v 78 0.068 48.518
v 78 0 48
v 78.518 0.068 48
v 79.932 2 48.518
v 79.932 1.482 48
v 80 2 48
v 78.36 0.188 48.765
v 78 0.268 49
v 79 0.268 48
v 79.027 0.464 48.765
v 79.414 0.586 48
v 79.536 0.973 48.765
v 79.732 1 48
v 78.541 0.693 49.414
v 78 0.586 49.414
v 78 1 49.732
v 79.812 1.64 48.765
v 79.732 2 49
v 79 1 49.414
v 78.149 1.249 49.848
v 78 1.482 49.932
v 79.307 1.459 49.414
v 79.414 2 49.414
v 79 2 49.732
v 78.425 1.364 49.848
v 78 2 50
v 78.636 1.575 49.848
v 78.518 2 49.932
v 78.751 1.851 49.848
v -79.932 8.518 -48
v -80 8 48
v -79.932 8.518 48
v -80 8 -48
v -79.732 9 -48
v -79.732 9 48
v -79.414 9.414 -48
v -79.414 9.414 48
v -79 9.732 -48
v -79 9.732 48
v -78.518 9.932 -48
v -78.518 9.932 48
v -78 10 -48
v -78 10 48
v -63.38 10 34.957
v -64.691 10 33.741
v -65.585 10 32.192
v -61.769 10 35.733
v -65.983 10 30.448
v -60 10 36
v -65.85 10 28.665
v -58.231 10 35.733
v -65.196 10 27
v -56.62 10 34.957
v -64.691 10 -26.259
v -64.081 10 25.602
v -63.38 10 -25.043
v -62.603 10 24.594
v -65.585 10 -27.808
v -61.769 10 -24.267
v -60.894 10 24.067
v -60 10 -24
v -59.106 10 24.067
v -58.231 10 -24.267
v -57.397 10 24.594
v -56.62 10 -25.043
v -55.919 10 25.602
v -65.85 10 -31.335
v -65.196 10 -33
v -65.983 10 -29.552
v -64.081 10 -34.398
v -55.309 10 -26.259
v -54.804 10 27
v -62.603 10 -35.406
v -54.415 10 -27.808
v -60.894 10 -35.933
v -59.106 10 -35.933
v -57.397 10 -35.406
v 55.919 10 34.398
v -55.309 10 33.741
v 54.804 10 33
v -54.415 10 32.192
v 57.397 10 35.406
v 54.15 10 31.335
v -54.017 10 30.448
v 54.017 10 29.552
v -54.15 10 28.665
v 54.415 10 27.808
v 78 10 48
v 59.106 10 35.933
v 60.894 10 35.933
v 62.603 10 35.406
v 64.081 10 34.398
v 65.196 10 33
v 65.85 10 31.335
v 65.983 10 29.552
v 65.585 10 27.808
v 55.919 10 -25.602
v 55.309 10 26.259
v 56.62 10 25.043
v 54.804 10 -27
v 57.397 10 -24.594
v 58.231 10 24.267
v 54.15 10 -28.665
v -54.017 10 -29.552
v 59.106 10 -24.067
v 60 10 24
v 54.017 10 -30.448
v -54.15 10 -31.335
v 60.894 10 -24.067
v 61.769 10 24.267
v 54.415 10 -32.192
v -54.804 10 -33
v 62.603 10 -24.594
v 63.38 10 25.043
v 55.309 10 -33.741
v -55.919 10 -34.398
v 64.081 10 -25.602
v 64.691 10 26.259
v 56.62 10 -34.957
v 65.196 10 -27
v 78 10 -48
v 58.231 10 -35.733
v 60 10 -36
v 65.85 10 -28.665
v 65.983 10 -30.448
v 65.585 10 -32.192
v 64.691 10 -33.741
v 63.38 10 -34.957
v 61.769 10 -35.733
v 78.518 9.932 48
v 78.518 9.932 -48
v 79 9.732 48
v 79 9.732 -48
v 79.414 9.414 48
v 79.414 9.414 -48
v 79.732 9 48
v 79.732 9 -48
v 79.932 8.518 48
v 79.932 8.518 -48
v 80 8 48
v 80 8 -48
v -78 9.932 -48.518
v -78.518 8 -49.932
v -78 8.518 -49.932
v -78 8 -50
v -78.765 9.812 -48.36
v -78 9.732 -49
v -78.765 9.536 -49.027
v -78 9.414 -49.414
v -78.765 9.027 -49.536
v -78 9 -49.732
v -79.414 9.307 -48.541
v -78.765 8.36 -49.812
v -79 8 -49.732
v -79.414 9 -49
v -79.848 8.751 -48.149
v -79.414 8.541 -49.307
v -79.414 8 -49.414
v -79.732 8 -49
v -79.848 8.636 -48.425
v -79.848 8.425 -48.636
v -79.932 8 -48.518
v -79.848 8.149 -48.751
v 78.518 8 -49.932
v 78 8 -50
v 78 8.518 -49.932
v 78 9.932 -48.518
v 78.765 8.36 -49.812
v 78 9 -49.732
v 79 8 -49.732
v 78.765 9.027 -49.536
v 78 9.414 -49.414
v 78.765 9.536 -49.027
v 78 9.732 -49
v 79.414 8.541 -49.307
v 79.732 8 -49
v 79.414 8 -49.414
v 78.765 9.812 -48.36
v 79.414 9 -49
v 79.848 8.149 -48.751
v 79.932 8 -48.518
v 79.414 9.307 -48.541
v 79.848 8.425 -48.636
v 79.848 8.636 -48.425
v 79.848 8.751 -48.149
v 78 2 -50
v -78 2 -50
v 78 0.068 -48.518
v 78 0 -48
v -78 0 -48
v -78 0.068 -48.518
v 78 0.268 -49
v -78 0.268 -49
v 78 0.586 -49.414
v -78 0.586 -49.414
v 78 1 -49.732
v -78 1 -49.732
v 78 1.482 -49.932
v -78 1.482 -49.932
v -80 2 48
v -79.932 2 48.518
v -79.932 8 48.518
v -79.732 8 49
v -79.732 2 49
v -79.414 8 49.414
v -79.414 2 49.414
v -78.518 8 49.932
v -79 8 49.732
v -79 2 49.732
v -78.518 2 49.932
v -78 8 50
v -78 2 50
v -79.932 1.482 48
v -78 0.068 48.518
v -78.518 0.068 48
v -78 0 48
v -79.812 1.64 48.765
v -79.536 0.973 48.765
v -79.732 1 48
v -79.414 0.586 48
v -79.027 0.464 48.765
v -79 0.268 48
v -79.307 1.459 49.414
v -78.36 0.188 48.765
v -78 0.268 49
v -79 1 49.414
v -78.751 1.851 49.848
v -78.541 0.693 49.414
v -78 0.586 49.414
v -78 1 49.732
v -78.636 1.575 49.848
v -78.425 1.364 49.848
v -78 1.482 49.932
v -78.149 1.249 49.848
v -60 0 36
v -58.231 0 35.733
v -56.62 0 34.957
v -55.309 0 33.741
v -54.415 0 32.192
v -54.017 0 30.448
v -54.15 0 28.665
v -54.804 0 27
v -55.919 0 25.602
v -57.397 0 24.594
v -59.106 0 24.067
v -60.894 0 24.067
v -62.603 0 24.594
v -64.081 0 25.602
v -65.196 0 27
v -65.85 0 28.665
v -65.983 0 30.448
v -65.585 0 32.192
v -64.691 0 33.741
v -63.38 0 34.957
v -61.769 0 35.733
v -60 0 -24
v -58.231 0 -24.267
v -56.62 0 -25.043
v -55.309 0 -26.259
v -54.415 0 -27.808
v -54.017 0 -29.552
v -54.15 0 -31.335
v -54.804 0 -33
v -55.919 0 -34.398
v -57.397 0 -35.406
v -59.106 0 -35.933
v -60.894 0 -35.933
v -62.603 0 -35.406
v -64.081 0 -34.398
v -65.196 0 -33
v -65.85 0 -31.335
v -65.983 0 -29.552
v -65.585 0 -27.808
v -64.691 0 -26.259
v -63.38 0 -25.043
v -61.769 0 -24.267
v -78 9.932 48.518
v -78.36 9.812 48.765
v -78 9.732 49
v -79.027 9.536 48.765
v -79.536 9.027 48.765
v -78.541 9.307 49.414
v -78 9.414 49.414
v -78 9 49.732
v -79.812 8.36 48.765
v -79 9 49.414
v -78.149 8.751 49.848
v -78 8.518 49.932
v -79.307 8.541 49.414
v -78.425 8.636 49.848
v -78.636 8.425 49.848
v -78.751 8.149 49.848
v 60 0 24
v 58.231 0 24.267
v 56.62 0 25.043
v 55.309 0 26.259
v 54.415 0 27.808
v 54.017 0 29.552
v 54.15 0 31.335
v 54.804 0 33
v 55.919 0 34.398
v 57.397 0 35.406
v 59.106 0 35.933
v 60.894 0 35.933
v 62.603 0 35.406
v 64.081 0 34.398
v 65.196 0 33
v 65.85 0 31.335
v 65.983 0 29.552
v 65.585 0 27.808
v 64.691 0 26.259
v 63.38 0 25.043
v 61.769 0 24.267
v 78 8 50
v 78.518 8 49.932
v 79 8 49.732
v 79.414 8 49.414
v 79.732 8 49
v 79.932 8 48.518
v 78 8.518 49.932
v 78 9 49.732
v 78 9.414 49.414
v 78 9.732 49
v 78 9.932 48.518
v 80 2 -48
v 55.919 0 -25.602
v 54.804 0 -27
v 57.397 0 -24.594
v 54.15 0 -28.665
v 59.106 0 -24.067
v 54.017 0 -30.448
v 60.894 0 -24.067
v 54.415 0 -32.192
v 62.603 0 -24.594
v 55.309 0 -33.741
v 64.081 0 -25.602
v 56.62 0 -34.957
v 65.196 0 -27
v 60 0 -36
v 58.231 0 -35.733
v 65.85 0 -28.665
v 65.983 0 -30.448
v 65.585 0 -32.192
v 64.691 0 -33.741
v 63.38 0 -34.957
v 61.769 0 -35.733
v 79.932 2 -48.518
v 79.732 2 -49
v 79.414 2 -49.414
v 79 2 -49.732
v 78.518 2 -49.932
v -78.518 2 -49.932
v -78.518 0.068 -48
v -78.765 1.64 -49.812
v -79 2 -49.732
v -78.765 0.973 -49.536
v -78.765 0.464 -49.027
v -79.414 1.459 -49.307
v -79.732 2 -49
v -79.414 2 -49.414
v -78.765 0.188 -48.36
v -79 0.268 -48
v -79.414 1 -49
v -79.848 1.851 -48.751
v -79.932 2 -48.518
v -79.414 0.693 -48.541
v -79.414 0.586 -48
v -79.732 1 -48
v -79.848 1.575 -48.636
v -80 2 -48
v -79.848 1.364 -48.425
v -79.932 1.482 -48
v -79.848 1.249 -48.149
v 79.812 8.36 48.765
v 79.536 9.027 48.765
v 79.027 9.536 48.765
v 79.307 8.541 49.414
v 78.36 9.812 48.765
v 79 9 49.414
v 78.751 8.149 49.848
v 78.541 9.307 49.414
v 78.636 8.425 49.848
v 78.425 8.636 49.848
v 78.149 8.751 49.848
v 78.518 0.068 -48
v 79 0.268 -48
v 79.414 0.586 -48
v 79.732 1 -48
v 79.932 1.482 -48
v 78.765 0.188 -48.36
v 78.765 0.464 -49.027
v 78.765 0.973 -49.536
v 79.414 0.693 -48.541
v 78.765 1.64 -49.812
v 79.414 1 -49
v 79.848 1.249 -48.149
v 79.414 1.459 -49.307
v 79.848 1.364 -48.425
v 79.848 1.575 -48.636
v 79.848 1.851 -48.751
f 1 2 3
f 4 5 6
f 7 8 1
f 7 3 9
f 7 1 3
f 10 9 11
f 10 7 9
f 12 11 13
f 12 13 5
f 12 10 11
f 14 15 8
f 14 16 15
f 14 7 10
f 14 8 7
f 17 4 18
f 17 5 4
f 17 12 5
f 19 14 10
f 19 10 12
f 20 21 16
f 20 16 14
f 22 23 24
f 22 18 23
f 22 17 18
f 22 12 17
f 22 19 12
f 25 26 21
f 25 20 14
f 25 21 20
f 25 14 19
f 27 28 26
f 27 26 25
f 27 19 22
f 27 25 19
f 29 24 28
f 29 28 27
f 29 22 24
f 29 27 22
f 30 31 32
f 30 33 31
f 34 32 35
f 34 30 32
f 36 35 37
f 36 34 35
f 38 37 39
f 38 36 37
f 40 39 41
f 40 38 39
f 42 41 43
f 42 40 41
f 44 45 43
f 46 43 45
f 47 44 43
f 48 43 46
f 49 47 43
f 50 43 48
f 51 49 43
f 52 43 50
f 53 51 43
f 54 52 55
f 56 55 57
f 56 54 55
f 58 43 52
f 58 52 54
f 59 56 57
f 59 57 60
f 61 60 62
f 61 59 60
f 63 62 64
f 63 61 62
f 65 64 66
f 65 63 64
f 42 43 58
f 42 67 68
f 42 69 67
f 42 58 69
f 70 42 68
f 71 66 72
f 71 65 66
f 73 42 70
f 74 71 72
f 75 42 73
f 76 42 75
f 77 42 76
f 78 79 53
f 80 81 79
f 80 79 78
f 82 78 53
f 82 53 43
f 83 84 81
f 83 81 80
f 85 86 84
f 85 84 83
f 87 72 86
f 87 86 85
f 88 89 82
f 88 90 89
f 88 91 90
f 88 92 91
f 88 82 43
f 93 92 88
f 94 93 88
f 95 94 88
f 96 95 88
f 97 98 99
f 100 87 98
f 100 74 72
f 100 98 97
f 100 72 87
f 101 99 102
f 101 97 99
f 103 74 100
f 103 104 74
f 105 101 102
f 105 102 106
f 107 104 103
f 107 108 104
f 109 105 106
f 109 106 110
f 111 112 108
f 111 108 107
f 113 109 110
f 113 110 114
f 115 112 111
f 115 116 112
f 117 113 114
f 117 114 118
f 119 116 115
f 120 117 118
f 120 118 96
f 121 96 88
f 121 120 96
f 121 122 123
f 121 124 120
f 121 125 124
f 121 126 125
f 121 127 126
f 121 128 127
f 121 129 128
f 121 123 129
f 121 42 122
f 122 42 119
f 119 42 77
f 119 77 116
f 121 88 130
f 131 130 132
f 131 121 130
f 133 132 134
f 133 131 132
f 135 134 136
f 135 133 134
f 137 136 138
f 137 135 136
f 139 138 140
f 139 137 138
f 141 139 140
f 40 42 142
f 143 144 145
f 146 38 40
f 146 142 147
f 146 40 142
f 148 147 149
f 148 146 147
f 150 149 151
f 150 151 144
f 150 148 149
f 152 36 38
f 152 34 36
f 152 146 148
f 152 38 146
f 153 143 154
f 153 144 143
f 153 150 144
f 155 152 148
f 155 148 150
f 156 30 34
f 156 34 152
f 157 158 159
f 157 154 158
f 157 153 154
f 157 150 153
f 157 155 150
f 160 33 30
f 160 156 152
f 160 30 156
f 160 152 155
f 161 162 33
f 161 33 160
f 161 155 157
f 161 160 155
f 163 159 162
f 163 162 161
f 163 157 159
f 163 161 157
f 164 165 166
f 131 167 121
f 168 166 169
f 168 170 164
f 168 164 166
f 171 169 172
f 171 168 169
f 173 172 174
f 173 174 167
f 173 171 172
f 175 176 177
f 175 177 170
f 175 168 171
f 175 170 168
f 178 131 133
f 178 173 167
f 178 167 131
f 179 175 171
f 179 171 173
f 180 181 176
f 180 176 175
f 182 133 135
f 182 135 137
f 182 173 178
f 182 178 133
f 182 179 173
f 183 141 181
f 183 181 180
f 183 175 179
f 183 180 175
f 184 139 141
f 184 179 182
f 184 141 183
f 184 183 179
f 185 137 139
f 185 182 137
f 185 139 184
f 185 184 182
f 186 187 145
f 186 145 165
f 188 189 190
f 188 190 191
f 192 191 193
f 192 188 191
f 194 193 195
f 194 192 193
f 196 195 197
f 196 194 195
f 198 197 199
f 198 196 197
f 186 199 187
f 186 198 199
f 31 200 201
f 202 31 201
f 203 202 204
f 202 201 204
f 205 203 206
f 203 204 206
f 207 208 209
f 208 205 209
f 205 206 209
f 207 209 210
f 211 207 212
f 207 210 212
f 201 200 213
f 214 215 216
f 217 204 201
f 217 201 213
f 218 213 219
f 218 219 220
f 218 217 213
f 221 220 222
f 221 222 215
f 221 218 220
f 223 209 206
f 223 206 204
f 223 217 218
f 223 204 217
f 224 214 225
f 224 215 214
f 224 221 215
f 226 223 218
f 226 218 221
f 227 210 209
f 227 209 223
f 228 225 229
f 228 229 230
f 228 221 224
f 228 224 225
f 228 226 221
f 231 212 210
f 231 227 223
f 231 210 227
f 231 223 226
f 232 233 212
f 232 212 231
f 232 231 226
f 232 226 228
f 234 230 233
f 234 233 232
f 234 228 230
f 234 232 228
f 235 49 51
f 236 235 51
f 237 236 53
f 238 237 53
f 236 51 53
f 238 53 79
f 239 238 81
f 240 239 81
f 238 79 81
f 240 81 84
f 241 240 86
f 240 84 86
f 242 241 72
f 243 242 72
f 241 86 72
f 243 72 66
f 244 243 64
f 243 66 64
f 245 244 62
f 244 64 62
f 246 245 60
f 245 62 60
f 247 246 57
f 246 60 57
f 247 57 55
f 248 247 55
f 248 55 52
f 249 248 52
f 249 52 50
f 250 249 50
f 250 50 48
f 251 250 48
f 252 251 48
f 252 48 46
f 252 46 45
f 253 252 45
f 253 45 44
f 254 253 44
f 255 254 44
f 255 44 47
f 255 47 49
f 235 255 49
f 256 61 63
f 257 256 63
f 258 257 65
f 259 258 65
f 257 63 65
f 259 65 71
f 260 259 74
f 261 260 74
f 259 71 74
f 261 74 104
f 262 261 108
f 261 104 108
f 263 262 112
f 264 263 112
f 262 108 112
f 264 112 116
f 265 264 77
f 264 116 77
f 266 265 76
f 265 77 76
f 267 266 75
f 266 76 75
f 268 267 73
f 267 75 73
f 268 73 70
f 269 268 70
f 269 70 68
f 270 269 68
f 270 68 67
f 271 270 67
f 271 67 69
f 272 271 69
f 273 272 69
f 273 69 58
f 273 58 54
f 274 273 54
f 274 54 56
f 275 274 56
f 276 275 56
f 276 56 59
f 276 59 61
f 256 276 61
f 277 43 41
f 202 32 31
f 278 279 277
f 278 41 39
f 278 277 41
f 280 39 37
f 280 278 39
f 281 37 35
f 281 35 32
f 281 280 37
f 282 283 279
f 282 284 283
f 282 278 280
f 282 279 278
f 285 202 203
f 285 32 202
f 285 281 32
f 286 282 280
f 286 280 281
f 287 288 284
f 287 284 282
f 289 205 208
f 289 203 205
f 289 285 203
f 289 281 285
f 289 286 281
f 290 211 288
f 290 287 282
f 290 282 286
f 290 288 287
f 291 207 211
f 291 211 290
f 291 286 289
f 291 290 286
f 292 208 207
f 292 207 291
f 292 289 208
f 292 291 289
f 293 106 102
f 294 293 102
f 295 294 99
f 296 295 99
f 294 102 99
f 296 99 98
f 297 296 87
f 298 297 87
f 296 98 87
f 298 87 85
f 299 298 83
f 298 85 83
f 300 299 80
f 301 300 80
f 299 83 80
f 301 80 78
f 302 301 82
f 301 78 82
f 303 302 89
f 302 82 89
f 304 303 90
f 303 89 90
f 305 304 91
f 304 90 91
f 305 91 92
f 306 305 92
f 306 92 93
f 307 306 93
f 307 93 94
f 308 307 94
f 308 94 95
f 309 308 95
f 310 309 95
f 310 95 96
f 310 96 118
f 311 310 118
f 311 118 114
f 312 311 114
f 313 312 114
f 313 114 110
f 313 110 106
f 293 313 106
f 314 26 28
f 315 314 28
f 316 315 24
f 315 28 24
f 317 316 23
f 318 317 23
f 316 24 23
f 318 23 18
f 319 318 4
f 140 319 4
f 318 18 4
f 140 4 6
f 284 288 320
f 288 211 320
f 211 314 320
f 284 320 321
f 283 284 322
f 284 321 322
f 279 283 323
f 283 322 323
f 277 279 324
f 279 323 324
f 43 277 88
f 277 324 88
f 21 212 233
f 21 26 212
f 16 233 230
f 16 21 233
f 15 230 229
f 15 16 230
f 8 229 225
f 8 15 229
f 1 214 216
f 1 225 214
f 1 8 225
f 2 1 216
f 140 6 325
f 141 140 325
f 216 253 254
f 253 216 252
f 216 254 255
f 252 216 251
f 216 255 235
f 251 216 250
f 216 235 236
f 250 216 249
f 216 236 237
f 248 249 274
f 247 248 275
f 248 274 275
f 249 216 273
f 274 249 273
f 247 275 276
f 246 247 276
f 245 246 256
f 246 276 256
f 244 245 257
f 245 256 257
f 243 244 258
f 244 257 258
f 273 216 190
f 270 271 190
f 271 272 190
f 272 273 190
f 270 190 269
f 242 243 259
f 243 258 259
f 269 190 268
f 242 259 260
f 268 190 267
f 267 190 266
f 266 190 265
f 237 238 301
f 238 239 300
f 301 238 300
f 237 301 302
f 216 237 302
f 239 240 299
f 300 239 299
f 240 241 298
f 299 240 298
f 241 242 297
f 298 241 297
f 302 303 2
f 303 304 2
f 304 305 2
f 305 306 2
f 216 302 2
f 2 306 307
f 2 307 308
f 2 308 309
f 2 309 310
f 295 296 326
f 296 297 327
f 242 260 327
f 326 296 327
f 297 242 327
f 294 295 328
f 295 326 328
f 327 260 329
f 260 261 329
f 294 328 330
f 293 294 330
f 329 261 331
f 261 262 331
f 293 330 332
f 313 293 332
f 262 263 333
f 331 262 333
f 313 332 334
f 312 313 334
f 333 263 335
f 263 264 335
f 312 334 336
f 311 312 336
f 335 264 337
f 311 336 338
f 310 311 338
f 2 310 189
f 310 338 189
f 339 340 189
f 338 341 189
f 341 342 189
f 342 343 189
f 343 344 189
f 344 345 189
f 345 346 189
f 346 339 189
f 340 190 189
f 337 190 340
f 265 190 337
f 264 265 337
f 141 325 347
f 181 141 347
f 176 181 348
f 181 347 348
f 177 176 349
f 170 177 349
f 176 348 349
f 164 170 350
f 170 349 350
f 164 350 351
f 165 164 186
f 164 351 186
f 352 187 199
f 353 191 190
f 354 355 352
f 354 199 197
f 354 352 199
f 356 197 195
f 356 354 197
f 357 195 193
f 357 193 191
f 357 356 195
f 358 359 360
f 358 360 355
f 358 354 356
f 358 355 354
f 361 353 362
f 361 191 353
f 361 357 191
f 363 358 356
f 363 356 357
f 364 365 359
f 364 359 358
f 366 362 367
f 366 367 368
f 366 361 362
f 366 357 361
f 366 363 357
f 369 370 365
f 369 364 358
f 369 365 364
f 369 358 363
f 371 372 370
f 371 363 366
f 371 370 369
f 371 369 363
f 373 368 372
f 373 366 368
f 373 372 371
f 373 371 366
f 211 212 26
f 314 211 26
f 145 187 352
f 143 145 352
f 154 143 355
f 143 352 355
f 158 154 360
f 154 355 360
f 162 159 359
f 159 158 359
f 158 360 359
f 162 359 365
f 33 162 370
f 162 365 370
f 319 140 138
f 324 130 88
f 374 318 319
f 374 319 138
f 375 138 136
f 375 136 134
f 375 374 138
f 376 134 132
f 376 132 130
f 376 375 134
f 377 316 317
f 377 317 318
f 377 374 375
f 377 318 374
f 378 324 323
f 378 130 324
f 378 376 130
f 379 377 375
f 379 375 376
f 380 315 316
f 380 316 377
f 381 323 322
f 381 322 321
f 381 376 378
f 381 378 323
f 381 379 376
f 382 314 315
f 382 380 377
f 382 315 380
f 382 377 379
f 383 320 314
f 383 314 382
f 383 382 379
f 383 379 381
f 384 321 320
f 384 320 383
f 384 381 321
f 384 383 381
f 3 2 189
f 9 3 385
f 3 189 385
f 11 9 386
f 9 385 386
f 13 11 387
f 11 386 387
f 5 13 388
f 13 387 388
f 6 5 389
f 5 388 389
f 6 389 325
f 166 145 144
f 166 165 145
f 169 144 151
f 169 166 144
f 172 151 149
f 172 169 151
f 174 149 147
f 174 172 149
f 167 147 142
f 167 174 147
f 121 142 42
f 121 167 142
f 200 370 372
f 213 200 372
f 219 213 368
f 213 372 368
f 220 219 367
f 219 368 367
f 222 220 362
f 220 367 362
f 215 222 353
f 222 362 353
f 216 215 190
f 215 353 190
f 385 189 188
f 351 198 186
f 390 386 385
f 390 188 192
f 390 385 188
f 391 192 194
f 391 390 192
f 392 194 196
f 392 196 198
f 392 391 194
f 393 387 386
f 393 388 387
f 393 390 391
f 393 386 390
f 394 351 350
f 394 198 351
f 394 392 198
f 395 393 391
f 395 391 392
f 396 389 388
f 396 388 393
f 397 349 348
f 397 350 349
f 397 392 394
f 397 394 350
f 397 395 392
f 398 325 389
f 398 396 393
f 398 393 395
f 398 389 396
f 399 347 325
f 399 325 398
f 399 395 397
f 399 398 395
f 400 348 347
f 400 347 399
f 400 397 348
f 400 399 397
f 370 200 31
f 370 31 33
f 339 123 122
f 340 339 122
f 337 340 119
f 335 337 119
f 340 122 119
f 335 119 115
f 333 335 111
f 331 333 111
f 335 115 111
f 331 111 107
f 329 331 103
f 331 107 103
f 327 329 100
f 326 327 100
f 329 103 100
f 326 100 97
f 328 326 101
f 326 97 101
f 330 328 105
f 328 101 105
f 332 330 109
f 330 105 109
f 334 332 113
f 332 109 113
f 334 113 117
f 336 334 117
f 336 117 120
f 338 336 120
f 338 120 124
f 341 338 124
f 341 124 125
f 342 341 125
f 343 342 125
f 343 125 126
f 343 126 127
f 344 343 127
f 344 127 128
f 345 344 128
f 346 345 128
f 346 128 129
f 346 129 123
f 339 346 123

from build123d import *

# Parameters (mm, degrees)
SKETCH1_W           = 160
SKETCH1_H           = 100
BOSS_EXTRUDE1_DEPTH = 10
SKETCH2_R           = 6
CUT_EXTRUDE1_DEPTH  = 95.868329805
FILLET1_R           = 2
FILLET2_R           = 2
FILLET3_R           = 2


with BuildPart() as part:
    # Sketch1 → Boss-Extrude1 (new body)
    with BuildSketch(Plane(origin=(0, 0, 0), x_dir=(1, 0, 0), z_dir=(0, 1, 0))):
        Rectangle(SKETCH1_W, SKETCH1_H)
    extrude(amount=BOSS_EXTRUDE1_DEPTH)

    # Sketch2 → Cut-Extrude1 (cut, through all)
    with BuildSketch(Plane(origin=(0, 10, 0), x_dir=(1, 0, 0), z_dir=(0, 1, 0))):
        with Locations(Location((-60, 30, 0), (0, 0, 270))):
            Circle(SKETCH2_R)
        with Locations(Location((-60, -30, 0), (0, 0, 270))):
            Circle(SKETCH2_R)
        with Locations(Location((60, -30, 0), (0, 0, 90))):
            Circle(SKETCH2_R)
        with Locations(Location((60, 30, 0), (0, 0, 90))):
            Circle(SKETCH2_R)
    extrude(amount=-CUT_EXTRUDE1_DEPTH, mode=Mode.SUBTRACT)

    # Fillet1
    fillet1_edges = [part.edges().sort_by_distance(p)[0] for p in [
        (-80, 10, 0),
        (0, 10, 50),
        (80, 10, 0),
        (0, 10, -50),
    ]]
    fillet(fillet1_edges, radius=FILLET1_R)

    # Fillet2
    fillet2_edges = [part.edges().sort_by_distance(p)[0] for p in [
        (0, 0, 50),
        (-80, 0, 0),
        (0, 0, -50),
        (80, 0, 0),
    ]]
    fillet(fillet2_edges, radius=FILLET2_R)

    # Fillet3
    # the kernel refuses this fillet: 2 mm, written as the material it takes off along each edge
    with BuildSketch(Plane(origin=(-78, 8, 48), x_dir=(-1, 0, 0), z_dir=(0, 0, 1))) as fillet3_piece_1_section:
        Polygon((0, 0), (FILLET3_R, 0), (FILLET3_R, -FILLET3_R), (0, -FILLET3_R), align=None)
    fillet3_piece_1 = extrude(amount=FILLET3_R, mode=Mode.PRIVATE)
    fillet3_piece_1 = fillet3_piece_1 - Plane(origin=(-78, 8, 48), x_dir=(0.7071067811865475, -0.7071067811865475, 0), z_dir=(0, 0, 1)) * Sphere(FILLET3_R, mode=Mode.PRIVATE)
    add(fillet3_piece_1, mode=Mode.SUBTRACT)
    with BuildSketch(Plane(origin=(-78, 8, -48), x_dir=(0, 0, -1), z_dir=(-1, 0, 0))) as fillet3_piece_2_section:
        Polygon((0, 0), (FILLET3_R, 0), (FILLET3_R, -FILLET3_R), (0, -FILLET3_R), align=None)
    fillet3_piece_2 = extrude(amount=FILLET3_R, mode=Mode.PRIVATE)
    fillet3_piece_2 = fillet3_piece_2 - Plane(origin=(-78, 8, -48), x_dir=(0, -0.7071067811865475, 0.7071067811865475), z_dir=(-1, 0, 0)) * Sphere(FILLET3_R, mode=Mode.PRIVATE)
    add(fillet3_piece_2, mode=Mode.SUBTRACT)
    with BuildSketch(Plane(origin=(78, 8, 48), x_dir=(1, 0, 0), z_dir=(0, 0, 1))) as fillet3_piece_3_section:
        Polygon((0, 0), (FILLET3_R, 0), (FILLET3_R, FILLET3_R), (0, FILLET3_R), align=None)
    fillet3_piece_3 = extrude(amount=FILLET3_R, mode=Mode.PRIVATE)
    fillet3_piece_3 = fillet3_piece_3 - Plane(origin=(78, 8, 48), x_dir=(-0.7071067811865475, -0.7071067811865475, 0), z_dir=(0, 0, 1)) * Sphere(FILLET3_R, mode=Mode.PRIVATE)
    add(fillet3_piece_3, mode=Mode.SUBTRACT)
    with BuildSketch(Plane(origin=(78, 8, -48), x_dir=(0, 0, -1), z_dir=(1, 0, 0))) as fillet3_piece_4_section:
        Polygon((0, 0), (FILLET3_R, 0), (FILLET3_R, FILLET3_R), (0, FILLET3_R), align=None)
    fillet3_piece_4 = extrude(amount=FILLET3_R, mode=Mode.PRIVATE)
    fillet3_piece_4 = fillet3_piece_4 - Plane(origin=(78, 8, -48), x_dir=(0, -0.7071067811865475, 0.7071067811865475), z_dir=(1, 0, 0)) * Sphere(FILLET3_R, mode=Mode.PRIVATE)
    add(fillet3_piece_4, mode=Mode.SUBTRACT)
    with BuildSketch(Plane(origin=(-78, 2, 48), x_dir=(-1, 0, 0), z_dir=(0, 0, 1))) as fillet3_piece_5_section:
        Polygon((0, 0), (FILLET3_R, 0), (FILLET3_R, FILLET3_R), (0, FILLET3_R), align=None)
    fillet3_piece_5 = extrude(amount=FILLET3_R, mode=Mode.PRIVATE)
    fillet3_piece_5 = fillet3_piece_5 - Plane(origin=(-78, 2, 48), x_dir=(0.7071067811865475, 0.7071067811865475, 0), z_dir=(0, 0, 1)) * Sphere(FILLET3_R, mode=Mode.PRIVATE)
    add(fillet3_piece_5, mode=Mode.SUBTRACT)
    with BuildSketch(Plane(origin=(-78, 2, -48), x_dir=(0, 0, -1), z_dir=(-1, 0, 0))) as fillet3_piece_6_section:
        Polygon((0, 0), (FILLET3_R, 0), (FILLET3_R, FILLET3_R), (0, FILLET3_R), align=None)
    fillet3_piece_6 = extrude(amount=FILLET3_R, mode=Mode.PRIVATE)
    fillet3_piece_6 = fillet3_piece_6 - Plane(origin=(-78, 2, -48), x_dir=(0, 0.7071067811865475, 0.7071067811865475), z_dir=(-1, 0, 0)) * Sphere(FILLET3_R, mode=Mode.PRIVATE)
    add(fillet3_piece_6, mode=Mode.SUBTRACT)
    with BuildSketch(Plane(origin=(78, 2, 48), x_dir=(1, 0, 0), z_dir=(0, 0, 1))) as fillet3_piece_7_section:
        Polygon((0, 0), (FILLET3_R, 0), (FILLET3_R, -FILLET3_R), (0, -FILLET3_R), align=None)
    fillet3_piece_7 = extrude(amount=FILLET3_R, mode=Mode.PRIVATE)
    fillet3_piece_7 = fillet3_piece_7 - Plane(origin=(78, 2, 48), x_dir=(-0.7071067811865475, 0.7071067811865475, 0), z_dir=(0, 0, 1)) * Sphere(FILLET3_R, mode=Mode.PRIVATE)
    add(fillet3_piece_7, mode=Mode.SUBTRACT)
    with BuildSketch(Plane(origin=(78, 2, -48), x_dir=(0, 0, -1), z_dir=(1, 0, 0))) as fillet3_piece_8_section:
        Polygon((0, 0), (FILLET3_R, 0), (FILLET3_R, -FILLET3_R), (0, -FILLET3_R), align=None)
    fillet3_piece_8 = extrude(amount=FILLET3_R, mode=Mode.PRIVATE)
    fillet3_piece_8 = fillet3_piece_8 - Plane(origin=(78, 2, -48), x_dir=(0, 0.7071067811865475, 0.7071067811865475), z_dir=(1, 0, 0)) * Sphere(FILLET3_R, mode=Mode.PRIVATE)
    add(fillet3_piece_8, mode=Mode.SUBTRACT)
    with BuildSketch(Plane(origin=(80, 2, -50), x_dir=(0, 0, 1), z_dir=(0, 1, 0)), Plane(origin=(80, 2, 50), x_dir=(-1, 0, 0), z_dir=(0, 1, 0))) as fillet3_piece_9:
        with BuildLine():
            CenterArc((FILLET3_R, -FILLET3_R), FILLET3_R, 90, 90)
            Line((0, -FILLET3_R), (0, 0))
            Line((0, 0), (FILLET3_R, 0))
        make_face()
    extrude(amount=6, mode=Mode.SUBTRACT)
    with BuildSketch(Plane(origin=(-80, 2, 50), x_dir=(1, 0, 0), z_dir=(0, 1, 0)), Plane(origin=(-80, 2, -50), x_dir=(0, 0, 1), z_dir=(0, 1, 0))) as fillet3_piece_10:
        with BuildLine():
            CenterArc((FILLET3_R, FILLET3_R), FILLET3_R, 180, 90)
            Line((0, FILLET3_R), (0, 0))
            Line((0, 0), (FILLET3_R, 0))
        make_face()
    extrude(amount=6, mode=Mode.SUBTRACT)


solid = part.part
